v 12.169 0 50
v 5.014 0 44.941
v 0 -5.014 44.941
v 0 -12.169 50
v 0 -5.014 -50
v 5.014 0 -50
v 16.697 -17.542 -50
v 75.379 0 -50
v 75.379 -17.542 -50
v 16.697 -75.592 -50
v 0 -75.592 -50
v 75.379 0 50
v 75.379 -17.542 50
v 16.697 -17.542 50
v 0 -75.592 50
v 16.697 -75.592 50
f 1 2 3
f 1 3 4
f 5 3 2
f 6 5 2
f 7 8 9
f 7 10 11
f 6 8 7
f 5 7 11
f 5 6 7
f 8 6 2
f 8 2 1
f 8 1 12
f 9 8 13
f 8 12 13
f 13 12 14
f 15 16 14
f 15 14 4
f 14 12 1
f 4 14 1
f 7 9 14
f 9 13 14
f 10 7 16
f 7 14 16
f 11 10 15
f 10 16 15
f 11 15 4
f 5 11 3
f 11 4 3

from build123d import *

# Parameters (mm, degrees)
BOSS_EXTRUDE1_DEPTH     = 50
CUT_EXTRUDE2_DEPTH      = 118.930495595
CUT_EXTRUDE2_DEPTH_BACK = 118.930495595


with BuildPart() as part:
    # Sketch2 → Boss-Extrude1 (new, symmetric)
    with BuildSketch(Plane.XY):
        Polygon((5.01375486, 0), (75.378877849, 0), (75.378877849, -17.541748785), (16.697188205, -17.541748785), (16.697188205, -75.591834267), (0, -75.591834267), (0, -5.01375486), align=None)
    extrude(amount=BOSS_EXTRUDE1_DEPTH, both=True)

    # Sketch6 → Cut-Extrude2 (cut, two sides: drawn at the far end of the back side and taken through both)
    with BuildSketch(Plane(origin=(-2.50687743, -2.50687743, 0), x_dir=(0, 0, 1), z_dir=(0.7071067811865464, 0.7071067811865488, 0)).offset(-CUT_EXTRUDE2_DEPTH_BACK)):
        Polygon((44.940550834, 3.545260061), (50.113588722, 8.718297949), (50.113590784, 3.494380863), align=None)
    extrude(amount=CUT_EXTRUDE2_DEPTH + CUT_EXTRUDE2_DEPTH_BACK, mode=Mode.SUBTRACT)


solid = part.part
